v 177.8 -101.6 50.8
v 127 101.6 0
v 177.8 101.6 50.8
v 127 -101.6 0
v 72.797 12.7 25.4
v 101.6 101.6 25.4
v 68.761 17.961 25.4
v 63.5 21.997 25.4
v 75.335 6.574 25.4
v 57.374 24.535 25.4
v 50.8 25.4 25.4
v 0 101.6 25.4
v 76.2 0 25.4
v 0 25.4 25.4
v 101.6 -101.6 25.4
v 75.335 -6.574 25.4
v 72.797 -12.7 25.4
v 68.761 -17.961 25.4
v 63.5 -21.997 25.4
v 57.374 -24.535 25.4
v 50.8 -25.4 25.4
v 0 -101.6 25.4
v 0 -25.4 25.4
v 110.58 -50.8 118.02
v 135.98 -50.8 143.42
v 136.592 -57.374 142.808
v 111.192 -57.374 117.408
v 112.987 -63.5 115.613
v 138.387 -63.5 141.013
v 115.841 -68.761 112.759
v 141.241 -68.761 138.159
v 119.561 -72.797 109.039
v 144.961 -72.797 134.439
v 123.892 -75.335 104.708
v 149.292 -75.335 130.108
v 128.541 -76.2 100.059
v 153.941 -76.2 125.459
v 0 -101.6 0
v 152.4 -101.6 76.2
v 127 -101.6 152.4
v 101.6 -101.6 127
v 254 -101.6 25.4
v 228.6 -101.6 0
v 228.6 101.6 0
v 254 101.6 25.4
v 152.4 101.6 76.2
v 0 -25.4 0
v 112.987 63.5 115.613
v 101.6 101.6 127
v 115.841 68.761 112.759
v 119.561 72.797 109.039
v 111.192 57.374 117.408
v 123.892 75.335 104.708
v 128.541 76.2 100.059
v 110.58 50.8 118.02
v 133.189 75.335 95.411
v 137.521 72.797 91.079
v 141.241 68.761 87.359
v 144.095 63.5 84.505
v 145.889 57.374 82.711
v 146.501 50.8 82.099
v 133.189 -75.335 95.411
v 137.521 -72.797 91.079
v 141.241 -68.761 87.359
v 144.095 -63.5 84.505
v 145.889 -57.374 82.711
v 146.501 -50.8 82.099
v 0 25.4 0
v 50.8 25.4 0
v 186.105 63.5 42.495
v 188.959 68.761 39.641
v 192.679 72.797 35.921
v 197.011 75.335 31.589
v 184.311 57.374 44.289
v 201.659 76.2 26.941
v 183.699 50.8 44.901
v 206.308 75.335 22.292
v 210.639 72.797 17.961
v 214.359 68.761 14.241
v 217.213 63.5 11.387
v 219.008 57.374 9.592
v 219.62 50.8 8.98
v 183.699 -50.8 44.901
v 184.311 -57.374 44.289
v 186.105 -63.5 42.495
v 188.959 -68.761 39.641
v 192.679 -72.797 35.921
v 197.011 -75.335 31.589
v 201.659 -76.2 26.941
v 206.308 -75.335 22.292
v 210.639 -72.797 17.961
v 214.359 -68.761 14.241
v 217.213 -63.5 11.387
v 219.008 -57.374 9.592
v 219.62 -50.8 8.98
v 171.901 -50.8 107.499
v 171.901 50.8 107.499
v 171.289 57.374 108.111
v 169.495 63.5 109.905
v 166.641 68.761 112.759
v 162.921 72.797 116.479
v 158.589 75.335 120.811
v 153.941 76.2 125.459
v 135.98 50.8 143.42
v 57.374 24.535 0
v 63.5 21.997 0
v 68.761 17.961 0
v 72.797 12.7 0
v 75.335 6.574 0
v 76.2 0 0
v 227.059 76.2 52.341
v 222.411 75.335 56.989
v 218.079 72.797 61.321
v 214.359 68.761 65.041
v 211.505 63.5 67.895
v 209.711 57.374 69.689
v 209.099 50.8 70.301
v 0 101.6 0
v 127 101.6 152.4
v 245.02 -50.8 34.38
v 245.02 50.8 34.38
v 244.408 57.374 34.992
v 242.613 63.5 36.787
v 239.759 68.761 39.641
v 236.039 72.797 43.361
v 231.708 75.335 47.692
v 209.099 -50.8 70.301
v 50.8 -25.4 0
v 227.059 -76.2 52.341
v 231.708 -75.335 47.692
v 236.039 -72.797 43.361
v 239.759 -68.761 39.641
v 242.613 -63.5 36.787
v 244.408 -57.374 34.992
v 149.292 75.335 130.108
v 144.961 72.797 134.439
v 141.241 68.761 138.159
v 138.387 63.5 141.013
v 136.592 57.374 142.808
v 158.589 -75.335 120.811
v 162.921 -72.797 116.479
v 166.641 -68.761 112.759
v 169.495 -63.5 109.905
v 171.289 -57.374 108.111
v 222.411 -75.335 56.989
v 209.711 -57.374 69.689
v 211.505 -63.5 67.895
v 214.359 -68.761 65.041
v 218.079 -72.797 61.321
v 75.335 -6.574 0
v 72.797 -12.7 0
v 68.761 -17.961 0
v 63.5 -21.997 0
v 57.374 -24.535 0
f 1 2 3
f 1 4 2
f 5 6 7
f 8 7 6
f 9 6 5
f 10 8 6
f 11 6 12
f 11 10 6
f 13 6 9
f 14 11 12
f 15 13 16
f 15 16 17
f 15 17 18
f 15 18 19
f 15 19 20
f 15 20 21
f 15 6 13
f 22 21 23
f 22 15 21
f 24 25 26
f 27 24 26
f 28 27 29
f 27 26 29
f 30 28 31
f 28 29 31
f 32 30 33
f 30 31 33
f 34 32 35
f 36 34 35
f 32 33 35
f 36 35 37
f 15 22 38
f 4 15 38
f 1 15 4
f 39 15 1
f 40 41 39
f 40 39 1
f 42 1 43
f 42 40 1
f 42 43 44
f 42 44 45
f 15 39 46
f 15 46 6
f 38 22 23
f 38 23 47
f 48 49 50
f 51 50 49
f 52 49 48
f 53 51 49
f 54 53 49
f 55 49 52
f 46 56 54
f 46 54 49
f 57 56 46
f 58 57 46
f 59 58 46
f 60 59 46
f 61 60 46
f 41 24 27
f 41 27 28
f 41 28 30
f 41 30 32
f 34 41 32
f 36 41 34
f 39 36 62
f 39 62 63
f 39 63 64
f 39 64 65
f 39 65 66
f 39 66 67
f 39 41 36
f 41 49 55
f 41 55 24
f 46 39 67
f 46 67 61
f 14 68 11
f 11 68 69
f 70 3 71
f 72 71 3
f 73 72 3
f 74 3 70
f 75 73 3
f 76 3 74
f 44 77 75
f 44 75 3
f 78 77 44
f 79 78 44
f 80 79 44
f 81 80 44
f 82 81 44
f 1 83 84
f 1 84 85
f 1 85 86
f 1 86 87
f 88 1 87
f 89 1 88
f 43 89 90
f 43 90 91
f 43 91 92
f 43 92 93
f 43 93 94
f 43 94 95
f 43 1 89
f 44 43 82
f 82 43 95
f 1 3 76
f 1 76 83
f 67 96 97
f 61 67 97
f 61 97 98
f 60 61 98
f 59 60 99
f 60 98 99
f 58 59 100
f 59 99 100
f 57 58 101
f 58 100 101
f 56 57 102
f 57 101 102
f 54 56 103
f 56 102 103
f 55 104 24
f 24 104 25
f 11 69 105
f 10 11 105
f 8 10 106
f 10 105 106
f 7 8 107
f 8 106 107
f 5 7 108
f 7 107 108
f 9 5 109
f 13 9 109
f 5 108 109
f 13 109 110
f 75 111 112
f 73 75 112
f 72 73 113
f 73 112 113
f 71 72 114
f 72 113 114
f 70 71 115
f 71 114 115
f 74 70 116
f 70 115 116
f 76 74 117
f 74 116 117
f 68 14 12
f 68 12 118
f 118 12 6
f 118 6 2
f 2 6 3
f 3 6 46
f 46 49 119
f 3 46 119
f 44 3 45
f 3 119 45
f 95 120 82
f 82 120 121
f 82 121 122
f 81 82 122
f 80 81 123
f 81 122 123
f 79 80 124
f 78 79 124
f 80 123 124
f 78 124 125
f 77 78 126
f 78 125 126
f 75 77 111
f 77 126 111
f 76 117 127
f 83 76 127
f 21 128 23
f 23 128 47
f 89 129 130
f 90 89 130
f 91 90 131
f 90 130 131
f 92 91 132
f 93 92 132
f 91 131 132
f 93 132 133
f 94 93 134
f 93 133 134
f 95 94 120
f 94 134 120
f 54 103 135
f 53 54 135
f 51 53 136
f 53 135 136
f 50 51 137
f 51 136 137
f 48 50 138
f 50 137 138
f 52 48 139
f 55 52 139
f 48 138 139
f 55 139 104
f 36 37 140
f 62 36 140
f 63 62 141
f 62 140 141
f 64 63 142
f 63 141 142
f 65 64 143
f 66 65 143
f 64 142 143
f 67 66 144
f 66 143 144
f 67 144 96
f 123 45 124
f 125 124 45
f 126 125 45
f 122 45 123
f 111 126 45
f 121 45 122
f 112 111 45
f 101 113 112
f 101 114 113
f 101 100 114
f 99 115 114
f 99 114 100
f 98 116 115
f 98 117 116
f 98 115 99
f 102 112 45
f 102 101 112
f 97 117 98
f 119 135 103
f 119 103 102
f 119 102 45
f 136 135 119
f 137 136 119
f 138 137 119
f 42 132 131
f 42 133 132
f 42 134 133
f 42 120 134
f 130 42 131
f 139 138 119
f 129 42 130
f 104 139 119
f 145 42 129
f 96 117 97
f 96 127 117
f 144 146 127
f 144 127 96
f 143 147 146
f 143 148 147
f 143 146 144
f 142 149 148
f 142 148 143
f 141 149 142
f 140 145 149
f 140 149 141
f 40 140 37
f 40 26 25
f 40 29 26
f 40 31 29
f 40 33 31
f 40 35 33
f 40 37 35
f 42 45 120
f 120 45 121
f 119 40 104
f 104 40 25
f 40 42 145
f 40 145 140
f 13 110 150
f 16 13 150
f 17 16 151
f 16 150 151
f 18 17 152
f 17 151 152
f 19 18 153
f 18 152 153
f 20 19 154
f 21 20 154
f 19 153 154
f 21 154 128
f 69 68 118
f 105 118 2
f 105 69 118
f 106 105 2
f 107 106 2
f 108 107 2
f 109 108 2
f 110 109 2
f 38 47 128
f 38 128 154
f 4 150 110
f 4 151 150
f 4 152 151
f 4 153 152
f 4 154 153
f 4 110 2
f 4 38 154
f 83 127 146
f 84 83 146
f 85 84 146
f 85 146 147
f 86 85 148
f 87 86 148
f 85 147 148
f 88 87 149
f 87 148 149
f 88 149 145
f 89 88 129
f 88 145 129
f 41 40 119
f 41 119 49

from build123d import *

# Parameters (mm, degrees)
F1_DEPTH = 101.6
F3_DEPTH = 25.4
F5_DEPTH = 37.846


with BuildPart() as f1:
    # F0 (on Front) → F1 (new body, symmetric)
    with BuildSketch(Plane.XZ):
        Polygon((152.4, 76.2), (152.4, 25.4), (177.8, 50.8), (228.6, 0), (254, 25.4), (127, 152.4), (101.6, 127), align=None)
        Polygon((152.4, 76.2), (101.6, 25.4), (152.4, 25.4), align=None)
        Polygon((0, 25.4), (0, 0), (127, 0), (152.4, 25.4), (101.6, 25.4), align=None)
    extrude(amount=F1_DEPTH, both=True)

    # F2 (on face) → F3 (cut)
    with BuildSketch(Plane(origin=(0, 0, 0), x_dir=(1, 0, 0), z_dir=(0, 0, -1))):
        with BuildLine():
            Line((0, 25.4), (0, 0))
            Line((0, 0), (0, -25.4))
            Line((0, -25.4), (50.8, -25.4))
            ThreePointArc((50.8, -25.4), (68.760512, -17.960512), (76.2, 0))
            ThreePointArc((76.2, 0), (68.760512, 17.960512), (50.8, 25.4))
            Line((50.8, 25.4), (0, 25.4))
        make_face()
    extrude(amount=-F3_DEPTH, mode=Mode.SUBTRACT)

    # F4 (on face) → F5 (cut)
    with BuildSketch(Plane(origin=(139.7, 0, 139.7), x_dir=(0, 1, 0), z_dir=(0.707107, 0, 0.707107))):
        with BuildLine():
            ThreePointArc((-76.2, -20.139488), (-68.760512, -38.1), (-50.8, -45.539488))
            Line((-50.8, -45.539488), (50.8, -45.539488))
            ThreePointArc((50.8, -45.539488), (68.760512, -38.1), (76.2, -20.139488))
            ThreePointArc((76.2, -20.139488), (68.760512, -2.178976), (50.8, 5.260512))
            Line((50.8, 5.260512), (-50.8, 5.260512))
            ThreePointArc((-50.8, 5.260512), (-68.760512, -2.178976), (-76.2, -20.139488))
        make_face()
        with BuildLine():
            ThreePointArc((50.8, -148.94461), (68.760512, -141.505122), (76.2, -123.54461))
            ThreePointArc((76.2, -123.54461), (68.760512, -105.584098), (50.8, -98.14461))
            Line((50.8, -98.14461), (-50.8, -98.14461))
            ThreePointArc((-50.8, -98.14461), (-68.760512, -105.584098), (-76.2, -123.54461))
            ThreePointArc((-76.2, -123.54461), (-68.760512, -141.505122), (-50.8, -148.94461))
            Line((-50.8, -148.94461), (50.8, -148.94461))
        make_face()
    extrude(amount=-F5_DEPTH, mode=Mode.SUBTRACT)


solid = f1.part
